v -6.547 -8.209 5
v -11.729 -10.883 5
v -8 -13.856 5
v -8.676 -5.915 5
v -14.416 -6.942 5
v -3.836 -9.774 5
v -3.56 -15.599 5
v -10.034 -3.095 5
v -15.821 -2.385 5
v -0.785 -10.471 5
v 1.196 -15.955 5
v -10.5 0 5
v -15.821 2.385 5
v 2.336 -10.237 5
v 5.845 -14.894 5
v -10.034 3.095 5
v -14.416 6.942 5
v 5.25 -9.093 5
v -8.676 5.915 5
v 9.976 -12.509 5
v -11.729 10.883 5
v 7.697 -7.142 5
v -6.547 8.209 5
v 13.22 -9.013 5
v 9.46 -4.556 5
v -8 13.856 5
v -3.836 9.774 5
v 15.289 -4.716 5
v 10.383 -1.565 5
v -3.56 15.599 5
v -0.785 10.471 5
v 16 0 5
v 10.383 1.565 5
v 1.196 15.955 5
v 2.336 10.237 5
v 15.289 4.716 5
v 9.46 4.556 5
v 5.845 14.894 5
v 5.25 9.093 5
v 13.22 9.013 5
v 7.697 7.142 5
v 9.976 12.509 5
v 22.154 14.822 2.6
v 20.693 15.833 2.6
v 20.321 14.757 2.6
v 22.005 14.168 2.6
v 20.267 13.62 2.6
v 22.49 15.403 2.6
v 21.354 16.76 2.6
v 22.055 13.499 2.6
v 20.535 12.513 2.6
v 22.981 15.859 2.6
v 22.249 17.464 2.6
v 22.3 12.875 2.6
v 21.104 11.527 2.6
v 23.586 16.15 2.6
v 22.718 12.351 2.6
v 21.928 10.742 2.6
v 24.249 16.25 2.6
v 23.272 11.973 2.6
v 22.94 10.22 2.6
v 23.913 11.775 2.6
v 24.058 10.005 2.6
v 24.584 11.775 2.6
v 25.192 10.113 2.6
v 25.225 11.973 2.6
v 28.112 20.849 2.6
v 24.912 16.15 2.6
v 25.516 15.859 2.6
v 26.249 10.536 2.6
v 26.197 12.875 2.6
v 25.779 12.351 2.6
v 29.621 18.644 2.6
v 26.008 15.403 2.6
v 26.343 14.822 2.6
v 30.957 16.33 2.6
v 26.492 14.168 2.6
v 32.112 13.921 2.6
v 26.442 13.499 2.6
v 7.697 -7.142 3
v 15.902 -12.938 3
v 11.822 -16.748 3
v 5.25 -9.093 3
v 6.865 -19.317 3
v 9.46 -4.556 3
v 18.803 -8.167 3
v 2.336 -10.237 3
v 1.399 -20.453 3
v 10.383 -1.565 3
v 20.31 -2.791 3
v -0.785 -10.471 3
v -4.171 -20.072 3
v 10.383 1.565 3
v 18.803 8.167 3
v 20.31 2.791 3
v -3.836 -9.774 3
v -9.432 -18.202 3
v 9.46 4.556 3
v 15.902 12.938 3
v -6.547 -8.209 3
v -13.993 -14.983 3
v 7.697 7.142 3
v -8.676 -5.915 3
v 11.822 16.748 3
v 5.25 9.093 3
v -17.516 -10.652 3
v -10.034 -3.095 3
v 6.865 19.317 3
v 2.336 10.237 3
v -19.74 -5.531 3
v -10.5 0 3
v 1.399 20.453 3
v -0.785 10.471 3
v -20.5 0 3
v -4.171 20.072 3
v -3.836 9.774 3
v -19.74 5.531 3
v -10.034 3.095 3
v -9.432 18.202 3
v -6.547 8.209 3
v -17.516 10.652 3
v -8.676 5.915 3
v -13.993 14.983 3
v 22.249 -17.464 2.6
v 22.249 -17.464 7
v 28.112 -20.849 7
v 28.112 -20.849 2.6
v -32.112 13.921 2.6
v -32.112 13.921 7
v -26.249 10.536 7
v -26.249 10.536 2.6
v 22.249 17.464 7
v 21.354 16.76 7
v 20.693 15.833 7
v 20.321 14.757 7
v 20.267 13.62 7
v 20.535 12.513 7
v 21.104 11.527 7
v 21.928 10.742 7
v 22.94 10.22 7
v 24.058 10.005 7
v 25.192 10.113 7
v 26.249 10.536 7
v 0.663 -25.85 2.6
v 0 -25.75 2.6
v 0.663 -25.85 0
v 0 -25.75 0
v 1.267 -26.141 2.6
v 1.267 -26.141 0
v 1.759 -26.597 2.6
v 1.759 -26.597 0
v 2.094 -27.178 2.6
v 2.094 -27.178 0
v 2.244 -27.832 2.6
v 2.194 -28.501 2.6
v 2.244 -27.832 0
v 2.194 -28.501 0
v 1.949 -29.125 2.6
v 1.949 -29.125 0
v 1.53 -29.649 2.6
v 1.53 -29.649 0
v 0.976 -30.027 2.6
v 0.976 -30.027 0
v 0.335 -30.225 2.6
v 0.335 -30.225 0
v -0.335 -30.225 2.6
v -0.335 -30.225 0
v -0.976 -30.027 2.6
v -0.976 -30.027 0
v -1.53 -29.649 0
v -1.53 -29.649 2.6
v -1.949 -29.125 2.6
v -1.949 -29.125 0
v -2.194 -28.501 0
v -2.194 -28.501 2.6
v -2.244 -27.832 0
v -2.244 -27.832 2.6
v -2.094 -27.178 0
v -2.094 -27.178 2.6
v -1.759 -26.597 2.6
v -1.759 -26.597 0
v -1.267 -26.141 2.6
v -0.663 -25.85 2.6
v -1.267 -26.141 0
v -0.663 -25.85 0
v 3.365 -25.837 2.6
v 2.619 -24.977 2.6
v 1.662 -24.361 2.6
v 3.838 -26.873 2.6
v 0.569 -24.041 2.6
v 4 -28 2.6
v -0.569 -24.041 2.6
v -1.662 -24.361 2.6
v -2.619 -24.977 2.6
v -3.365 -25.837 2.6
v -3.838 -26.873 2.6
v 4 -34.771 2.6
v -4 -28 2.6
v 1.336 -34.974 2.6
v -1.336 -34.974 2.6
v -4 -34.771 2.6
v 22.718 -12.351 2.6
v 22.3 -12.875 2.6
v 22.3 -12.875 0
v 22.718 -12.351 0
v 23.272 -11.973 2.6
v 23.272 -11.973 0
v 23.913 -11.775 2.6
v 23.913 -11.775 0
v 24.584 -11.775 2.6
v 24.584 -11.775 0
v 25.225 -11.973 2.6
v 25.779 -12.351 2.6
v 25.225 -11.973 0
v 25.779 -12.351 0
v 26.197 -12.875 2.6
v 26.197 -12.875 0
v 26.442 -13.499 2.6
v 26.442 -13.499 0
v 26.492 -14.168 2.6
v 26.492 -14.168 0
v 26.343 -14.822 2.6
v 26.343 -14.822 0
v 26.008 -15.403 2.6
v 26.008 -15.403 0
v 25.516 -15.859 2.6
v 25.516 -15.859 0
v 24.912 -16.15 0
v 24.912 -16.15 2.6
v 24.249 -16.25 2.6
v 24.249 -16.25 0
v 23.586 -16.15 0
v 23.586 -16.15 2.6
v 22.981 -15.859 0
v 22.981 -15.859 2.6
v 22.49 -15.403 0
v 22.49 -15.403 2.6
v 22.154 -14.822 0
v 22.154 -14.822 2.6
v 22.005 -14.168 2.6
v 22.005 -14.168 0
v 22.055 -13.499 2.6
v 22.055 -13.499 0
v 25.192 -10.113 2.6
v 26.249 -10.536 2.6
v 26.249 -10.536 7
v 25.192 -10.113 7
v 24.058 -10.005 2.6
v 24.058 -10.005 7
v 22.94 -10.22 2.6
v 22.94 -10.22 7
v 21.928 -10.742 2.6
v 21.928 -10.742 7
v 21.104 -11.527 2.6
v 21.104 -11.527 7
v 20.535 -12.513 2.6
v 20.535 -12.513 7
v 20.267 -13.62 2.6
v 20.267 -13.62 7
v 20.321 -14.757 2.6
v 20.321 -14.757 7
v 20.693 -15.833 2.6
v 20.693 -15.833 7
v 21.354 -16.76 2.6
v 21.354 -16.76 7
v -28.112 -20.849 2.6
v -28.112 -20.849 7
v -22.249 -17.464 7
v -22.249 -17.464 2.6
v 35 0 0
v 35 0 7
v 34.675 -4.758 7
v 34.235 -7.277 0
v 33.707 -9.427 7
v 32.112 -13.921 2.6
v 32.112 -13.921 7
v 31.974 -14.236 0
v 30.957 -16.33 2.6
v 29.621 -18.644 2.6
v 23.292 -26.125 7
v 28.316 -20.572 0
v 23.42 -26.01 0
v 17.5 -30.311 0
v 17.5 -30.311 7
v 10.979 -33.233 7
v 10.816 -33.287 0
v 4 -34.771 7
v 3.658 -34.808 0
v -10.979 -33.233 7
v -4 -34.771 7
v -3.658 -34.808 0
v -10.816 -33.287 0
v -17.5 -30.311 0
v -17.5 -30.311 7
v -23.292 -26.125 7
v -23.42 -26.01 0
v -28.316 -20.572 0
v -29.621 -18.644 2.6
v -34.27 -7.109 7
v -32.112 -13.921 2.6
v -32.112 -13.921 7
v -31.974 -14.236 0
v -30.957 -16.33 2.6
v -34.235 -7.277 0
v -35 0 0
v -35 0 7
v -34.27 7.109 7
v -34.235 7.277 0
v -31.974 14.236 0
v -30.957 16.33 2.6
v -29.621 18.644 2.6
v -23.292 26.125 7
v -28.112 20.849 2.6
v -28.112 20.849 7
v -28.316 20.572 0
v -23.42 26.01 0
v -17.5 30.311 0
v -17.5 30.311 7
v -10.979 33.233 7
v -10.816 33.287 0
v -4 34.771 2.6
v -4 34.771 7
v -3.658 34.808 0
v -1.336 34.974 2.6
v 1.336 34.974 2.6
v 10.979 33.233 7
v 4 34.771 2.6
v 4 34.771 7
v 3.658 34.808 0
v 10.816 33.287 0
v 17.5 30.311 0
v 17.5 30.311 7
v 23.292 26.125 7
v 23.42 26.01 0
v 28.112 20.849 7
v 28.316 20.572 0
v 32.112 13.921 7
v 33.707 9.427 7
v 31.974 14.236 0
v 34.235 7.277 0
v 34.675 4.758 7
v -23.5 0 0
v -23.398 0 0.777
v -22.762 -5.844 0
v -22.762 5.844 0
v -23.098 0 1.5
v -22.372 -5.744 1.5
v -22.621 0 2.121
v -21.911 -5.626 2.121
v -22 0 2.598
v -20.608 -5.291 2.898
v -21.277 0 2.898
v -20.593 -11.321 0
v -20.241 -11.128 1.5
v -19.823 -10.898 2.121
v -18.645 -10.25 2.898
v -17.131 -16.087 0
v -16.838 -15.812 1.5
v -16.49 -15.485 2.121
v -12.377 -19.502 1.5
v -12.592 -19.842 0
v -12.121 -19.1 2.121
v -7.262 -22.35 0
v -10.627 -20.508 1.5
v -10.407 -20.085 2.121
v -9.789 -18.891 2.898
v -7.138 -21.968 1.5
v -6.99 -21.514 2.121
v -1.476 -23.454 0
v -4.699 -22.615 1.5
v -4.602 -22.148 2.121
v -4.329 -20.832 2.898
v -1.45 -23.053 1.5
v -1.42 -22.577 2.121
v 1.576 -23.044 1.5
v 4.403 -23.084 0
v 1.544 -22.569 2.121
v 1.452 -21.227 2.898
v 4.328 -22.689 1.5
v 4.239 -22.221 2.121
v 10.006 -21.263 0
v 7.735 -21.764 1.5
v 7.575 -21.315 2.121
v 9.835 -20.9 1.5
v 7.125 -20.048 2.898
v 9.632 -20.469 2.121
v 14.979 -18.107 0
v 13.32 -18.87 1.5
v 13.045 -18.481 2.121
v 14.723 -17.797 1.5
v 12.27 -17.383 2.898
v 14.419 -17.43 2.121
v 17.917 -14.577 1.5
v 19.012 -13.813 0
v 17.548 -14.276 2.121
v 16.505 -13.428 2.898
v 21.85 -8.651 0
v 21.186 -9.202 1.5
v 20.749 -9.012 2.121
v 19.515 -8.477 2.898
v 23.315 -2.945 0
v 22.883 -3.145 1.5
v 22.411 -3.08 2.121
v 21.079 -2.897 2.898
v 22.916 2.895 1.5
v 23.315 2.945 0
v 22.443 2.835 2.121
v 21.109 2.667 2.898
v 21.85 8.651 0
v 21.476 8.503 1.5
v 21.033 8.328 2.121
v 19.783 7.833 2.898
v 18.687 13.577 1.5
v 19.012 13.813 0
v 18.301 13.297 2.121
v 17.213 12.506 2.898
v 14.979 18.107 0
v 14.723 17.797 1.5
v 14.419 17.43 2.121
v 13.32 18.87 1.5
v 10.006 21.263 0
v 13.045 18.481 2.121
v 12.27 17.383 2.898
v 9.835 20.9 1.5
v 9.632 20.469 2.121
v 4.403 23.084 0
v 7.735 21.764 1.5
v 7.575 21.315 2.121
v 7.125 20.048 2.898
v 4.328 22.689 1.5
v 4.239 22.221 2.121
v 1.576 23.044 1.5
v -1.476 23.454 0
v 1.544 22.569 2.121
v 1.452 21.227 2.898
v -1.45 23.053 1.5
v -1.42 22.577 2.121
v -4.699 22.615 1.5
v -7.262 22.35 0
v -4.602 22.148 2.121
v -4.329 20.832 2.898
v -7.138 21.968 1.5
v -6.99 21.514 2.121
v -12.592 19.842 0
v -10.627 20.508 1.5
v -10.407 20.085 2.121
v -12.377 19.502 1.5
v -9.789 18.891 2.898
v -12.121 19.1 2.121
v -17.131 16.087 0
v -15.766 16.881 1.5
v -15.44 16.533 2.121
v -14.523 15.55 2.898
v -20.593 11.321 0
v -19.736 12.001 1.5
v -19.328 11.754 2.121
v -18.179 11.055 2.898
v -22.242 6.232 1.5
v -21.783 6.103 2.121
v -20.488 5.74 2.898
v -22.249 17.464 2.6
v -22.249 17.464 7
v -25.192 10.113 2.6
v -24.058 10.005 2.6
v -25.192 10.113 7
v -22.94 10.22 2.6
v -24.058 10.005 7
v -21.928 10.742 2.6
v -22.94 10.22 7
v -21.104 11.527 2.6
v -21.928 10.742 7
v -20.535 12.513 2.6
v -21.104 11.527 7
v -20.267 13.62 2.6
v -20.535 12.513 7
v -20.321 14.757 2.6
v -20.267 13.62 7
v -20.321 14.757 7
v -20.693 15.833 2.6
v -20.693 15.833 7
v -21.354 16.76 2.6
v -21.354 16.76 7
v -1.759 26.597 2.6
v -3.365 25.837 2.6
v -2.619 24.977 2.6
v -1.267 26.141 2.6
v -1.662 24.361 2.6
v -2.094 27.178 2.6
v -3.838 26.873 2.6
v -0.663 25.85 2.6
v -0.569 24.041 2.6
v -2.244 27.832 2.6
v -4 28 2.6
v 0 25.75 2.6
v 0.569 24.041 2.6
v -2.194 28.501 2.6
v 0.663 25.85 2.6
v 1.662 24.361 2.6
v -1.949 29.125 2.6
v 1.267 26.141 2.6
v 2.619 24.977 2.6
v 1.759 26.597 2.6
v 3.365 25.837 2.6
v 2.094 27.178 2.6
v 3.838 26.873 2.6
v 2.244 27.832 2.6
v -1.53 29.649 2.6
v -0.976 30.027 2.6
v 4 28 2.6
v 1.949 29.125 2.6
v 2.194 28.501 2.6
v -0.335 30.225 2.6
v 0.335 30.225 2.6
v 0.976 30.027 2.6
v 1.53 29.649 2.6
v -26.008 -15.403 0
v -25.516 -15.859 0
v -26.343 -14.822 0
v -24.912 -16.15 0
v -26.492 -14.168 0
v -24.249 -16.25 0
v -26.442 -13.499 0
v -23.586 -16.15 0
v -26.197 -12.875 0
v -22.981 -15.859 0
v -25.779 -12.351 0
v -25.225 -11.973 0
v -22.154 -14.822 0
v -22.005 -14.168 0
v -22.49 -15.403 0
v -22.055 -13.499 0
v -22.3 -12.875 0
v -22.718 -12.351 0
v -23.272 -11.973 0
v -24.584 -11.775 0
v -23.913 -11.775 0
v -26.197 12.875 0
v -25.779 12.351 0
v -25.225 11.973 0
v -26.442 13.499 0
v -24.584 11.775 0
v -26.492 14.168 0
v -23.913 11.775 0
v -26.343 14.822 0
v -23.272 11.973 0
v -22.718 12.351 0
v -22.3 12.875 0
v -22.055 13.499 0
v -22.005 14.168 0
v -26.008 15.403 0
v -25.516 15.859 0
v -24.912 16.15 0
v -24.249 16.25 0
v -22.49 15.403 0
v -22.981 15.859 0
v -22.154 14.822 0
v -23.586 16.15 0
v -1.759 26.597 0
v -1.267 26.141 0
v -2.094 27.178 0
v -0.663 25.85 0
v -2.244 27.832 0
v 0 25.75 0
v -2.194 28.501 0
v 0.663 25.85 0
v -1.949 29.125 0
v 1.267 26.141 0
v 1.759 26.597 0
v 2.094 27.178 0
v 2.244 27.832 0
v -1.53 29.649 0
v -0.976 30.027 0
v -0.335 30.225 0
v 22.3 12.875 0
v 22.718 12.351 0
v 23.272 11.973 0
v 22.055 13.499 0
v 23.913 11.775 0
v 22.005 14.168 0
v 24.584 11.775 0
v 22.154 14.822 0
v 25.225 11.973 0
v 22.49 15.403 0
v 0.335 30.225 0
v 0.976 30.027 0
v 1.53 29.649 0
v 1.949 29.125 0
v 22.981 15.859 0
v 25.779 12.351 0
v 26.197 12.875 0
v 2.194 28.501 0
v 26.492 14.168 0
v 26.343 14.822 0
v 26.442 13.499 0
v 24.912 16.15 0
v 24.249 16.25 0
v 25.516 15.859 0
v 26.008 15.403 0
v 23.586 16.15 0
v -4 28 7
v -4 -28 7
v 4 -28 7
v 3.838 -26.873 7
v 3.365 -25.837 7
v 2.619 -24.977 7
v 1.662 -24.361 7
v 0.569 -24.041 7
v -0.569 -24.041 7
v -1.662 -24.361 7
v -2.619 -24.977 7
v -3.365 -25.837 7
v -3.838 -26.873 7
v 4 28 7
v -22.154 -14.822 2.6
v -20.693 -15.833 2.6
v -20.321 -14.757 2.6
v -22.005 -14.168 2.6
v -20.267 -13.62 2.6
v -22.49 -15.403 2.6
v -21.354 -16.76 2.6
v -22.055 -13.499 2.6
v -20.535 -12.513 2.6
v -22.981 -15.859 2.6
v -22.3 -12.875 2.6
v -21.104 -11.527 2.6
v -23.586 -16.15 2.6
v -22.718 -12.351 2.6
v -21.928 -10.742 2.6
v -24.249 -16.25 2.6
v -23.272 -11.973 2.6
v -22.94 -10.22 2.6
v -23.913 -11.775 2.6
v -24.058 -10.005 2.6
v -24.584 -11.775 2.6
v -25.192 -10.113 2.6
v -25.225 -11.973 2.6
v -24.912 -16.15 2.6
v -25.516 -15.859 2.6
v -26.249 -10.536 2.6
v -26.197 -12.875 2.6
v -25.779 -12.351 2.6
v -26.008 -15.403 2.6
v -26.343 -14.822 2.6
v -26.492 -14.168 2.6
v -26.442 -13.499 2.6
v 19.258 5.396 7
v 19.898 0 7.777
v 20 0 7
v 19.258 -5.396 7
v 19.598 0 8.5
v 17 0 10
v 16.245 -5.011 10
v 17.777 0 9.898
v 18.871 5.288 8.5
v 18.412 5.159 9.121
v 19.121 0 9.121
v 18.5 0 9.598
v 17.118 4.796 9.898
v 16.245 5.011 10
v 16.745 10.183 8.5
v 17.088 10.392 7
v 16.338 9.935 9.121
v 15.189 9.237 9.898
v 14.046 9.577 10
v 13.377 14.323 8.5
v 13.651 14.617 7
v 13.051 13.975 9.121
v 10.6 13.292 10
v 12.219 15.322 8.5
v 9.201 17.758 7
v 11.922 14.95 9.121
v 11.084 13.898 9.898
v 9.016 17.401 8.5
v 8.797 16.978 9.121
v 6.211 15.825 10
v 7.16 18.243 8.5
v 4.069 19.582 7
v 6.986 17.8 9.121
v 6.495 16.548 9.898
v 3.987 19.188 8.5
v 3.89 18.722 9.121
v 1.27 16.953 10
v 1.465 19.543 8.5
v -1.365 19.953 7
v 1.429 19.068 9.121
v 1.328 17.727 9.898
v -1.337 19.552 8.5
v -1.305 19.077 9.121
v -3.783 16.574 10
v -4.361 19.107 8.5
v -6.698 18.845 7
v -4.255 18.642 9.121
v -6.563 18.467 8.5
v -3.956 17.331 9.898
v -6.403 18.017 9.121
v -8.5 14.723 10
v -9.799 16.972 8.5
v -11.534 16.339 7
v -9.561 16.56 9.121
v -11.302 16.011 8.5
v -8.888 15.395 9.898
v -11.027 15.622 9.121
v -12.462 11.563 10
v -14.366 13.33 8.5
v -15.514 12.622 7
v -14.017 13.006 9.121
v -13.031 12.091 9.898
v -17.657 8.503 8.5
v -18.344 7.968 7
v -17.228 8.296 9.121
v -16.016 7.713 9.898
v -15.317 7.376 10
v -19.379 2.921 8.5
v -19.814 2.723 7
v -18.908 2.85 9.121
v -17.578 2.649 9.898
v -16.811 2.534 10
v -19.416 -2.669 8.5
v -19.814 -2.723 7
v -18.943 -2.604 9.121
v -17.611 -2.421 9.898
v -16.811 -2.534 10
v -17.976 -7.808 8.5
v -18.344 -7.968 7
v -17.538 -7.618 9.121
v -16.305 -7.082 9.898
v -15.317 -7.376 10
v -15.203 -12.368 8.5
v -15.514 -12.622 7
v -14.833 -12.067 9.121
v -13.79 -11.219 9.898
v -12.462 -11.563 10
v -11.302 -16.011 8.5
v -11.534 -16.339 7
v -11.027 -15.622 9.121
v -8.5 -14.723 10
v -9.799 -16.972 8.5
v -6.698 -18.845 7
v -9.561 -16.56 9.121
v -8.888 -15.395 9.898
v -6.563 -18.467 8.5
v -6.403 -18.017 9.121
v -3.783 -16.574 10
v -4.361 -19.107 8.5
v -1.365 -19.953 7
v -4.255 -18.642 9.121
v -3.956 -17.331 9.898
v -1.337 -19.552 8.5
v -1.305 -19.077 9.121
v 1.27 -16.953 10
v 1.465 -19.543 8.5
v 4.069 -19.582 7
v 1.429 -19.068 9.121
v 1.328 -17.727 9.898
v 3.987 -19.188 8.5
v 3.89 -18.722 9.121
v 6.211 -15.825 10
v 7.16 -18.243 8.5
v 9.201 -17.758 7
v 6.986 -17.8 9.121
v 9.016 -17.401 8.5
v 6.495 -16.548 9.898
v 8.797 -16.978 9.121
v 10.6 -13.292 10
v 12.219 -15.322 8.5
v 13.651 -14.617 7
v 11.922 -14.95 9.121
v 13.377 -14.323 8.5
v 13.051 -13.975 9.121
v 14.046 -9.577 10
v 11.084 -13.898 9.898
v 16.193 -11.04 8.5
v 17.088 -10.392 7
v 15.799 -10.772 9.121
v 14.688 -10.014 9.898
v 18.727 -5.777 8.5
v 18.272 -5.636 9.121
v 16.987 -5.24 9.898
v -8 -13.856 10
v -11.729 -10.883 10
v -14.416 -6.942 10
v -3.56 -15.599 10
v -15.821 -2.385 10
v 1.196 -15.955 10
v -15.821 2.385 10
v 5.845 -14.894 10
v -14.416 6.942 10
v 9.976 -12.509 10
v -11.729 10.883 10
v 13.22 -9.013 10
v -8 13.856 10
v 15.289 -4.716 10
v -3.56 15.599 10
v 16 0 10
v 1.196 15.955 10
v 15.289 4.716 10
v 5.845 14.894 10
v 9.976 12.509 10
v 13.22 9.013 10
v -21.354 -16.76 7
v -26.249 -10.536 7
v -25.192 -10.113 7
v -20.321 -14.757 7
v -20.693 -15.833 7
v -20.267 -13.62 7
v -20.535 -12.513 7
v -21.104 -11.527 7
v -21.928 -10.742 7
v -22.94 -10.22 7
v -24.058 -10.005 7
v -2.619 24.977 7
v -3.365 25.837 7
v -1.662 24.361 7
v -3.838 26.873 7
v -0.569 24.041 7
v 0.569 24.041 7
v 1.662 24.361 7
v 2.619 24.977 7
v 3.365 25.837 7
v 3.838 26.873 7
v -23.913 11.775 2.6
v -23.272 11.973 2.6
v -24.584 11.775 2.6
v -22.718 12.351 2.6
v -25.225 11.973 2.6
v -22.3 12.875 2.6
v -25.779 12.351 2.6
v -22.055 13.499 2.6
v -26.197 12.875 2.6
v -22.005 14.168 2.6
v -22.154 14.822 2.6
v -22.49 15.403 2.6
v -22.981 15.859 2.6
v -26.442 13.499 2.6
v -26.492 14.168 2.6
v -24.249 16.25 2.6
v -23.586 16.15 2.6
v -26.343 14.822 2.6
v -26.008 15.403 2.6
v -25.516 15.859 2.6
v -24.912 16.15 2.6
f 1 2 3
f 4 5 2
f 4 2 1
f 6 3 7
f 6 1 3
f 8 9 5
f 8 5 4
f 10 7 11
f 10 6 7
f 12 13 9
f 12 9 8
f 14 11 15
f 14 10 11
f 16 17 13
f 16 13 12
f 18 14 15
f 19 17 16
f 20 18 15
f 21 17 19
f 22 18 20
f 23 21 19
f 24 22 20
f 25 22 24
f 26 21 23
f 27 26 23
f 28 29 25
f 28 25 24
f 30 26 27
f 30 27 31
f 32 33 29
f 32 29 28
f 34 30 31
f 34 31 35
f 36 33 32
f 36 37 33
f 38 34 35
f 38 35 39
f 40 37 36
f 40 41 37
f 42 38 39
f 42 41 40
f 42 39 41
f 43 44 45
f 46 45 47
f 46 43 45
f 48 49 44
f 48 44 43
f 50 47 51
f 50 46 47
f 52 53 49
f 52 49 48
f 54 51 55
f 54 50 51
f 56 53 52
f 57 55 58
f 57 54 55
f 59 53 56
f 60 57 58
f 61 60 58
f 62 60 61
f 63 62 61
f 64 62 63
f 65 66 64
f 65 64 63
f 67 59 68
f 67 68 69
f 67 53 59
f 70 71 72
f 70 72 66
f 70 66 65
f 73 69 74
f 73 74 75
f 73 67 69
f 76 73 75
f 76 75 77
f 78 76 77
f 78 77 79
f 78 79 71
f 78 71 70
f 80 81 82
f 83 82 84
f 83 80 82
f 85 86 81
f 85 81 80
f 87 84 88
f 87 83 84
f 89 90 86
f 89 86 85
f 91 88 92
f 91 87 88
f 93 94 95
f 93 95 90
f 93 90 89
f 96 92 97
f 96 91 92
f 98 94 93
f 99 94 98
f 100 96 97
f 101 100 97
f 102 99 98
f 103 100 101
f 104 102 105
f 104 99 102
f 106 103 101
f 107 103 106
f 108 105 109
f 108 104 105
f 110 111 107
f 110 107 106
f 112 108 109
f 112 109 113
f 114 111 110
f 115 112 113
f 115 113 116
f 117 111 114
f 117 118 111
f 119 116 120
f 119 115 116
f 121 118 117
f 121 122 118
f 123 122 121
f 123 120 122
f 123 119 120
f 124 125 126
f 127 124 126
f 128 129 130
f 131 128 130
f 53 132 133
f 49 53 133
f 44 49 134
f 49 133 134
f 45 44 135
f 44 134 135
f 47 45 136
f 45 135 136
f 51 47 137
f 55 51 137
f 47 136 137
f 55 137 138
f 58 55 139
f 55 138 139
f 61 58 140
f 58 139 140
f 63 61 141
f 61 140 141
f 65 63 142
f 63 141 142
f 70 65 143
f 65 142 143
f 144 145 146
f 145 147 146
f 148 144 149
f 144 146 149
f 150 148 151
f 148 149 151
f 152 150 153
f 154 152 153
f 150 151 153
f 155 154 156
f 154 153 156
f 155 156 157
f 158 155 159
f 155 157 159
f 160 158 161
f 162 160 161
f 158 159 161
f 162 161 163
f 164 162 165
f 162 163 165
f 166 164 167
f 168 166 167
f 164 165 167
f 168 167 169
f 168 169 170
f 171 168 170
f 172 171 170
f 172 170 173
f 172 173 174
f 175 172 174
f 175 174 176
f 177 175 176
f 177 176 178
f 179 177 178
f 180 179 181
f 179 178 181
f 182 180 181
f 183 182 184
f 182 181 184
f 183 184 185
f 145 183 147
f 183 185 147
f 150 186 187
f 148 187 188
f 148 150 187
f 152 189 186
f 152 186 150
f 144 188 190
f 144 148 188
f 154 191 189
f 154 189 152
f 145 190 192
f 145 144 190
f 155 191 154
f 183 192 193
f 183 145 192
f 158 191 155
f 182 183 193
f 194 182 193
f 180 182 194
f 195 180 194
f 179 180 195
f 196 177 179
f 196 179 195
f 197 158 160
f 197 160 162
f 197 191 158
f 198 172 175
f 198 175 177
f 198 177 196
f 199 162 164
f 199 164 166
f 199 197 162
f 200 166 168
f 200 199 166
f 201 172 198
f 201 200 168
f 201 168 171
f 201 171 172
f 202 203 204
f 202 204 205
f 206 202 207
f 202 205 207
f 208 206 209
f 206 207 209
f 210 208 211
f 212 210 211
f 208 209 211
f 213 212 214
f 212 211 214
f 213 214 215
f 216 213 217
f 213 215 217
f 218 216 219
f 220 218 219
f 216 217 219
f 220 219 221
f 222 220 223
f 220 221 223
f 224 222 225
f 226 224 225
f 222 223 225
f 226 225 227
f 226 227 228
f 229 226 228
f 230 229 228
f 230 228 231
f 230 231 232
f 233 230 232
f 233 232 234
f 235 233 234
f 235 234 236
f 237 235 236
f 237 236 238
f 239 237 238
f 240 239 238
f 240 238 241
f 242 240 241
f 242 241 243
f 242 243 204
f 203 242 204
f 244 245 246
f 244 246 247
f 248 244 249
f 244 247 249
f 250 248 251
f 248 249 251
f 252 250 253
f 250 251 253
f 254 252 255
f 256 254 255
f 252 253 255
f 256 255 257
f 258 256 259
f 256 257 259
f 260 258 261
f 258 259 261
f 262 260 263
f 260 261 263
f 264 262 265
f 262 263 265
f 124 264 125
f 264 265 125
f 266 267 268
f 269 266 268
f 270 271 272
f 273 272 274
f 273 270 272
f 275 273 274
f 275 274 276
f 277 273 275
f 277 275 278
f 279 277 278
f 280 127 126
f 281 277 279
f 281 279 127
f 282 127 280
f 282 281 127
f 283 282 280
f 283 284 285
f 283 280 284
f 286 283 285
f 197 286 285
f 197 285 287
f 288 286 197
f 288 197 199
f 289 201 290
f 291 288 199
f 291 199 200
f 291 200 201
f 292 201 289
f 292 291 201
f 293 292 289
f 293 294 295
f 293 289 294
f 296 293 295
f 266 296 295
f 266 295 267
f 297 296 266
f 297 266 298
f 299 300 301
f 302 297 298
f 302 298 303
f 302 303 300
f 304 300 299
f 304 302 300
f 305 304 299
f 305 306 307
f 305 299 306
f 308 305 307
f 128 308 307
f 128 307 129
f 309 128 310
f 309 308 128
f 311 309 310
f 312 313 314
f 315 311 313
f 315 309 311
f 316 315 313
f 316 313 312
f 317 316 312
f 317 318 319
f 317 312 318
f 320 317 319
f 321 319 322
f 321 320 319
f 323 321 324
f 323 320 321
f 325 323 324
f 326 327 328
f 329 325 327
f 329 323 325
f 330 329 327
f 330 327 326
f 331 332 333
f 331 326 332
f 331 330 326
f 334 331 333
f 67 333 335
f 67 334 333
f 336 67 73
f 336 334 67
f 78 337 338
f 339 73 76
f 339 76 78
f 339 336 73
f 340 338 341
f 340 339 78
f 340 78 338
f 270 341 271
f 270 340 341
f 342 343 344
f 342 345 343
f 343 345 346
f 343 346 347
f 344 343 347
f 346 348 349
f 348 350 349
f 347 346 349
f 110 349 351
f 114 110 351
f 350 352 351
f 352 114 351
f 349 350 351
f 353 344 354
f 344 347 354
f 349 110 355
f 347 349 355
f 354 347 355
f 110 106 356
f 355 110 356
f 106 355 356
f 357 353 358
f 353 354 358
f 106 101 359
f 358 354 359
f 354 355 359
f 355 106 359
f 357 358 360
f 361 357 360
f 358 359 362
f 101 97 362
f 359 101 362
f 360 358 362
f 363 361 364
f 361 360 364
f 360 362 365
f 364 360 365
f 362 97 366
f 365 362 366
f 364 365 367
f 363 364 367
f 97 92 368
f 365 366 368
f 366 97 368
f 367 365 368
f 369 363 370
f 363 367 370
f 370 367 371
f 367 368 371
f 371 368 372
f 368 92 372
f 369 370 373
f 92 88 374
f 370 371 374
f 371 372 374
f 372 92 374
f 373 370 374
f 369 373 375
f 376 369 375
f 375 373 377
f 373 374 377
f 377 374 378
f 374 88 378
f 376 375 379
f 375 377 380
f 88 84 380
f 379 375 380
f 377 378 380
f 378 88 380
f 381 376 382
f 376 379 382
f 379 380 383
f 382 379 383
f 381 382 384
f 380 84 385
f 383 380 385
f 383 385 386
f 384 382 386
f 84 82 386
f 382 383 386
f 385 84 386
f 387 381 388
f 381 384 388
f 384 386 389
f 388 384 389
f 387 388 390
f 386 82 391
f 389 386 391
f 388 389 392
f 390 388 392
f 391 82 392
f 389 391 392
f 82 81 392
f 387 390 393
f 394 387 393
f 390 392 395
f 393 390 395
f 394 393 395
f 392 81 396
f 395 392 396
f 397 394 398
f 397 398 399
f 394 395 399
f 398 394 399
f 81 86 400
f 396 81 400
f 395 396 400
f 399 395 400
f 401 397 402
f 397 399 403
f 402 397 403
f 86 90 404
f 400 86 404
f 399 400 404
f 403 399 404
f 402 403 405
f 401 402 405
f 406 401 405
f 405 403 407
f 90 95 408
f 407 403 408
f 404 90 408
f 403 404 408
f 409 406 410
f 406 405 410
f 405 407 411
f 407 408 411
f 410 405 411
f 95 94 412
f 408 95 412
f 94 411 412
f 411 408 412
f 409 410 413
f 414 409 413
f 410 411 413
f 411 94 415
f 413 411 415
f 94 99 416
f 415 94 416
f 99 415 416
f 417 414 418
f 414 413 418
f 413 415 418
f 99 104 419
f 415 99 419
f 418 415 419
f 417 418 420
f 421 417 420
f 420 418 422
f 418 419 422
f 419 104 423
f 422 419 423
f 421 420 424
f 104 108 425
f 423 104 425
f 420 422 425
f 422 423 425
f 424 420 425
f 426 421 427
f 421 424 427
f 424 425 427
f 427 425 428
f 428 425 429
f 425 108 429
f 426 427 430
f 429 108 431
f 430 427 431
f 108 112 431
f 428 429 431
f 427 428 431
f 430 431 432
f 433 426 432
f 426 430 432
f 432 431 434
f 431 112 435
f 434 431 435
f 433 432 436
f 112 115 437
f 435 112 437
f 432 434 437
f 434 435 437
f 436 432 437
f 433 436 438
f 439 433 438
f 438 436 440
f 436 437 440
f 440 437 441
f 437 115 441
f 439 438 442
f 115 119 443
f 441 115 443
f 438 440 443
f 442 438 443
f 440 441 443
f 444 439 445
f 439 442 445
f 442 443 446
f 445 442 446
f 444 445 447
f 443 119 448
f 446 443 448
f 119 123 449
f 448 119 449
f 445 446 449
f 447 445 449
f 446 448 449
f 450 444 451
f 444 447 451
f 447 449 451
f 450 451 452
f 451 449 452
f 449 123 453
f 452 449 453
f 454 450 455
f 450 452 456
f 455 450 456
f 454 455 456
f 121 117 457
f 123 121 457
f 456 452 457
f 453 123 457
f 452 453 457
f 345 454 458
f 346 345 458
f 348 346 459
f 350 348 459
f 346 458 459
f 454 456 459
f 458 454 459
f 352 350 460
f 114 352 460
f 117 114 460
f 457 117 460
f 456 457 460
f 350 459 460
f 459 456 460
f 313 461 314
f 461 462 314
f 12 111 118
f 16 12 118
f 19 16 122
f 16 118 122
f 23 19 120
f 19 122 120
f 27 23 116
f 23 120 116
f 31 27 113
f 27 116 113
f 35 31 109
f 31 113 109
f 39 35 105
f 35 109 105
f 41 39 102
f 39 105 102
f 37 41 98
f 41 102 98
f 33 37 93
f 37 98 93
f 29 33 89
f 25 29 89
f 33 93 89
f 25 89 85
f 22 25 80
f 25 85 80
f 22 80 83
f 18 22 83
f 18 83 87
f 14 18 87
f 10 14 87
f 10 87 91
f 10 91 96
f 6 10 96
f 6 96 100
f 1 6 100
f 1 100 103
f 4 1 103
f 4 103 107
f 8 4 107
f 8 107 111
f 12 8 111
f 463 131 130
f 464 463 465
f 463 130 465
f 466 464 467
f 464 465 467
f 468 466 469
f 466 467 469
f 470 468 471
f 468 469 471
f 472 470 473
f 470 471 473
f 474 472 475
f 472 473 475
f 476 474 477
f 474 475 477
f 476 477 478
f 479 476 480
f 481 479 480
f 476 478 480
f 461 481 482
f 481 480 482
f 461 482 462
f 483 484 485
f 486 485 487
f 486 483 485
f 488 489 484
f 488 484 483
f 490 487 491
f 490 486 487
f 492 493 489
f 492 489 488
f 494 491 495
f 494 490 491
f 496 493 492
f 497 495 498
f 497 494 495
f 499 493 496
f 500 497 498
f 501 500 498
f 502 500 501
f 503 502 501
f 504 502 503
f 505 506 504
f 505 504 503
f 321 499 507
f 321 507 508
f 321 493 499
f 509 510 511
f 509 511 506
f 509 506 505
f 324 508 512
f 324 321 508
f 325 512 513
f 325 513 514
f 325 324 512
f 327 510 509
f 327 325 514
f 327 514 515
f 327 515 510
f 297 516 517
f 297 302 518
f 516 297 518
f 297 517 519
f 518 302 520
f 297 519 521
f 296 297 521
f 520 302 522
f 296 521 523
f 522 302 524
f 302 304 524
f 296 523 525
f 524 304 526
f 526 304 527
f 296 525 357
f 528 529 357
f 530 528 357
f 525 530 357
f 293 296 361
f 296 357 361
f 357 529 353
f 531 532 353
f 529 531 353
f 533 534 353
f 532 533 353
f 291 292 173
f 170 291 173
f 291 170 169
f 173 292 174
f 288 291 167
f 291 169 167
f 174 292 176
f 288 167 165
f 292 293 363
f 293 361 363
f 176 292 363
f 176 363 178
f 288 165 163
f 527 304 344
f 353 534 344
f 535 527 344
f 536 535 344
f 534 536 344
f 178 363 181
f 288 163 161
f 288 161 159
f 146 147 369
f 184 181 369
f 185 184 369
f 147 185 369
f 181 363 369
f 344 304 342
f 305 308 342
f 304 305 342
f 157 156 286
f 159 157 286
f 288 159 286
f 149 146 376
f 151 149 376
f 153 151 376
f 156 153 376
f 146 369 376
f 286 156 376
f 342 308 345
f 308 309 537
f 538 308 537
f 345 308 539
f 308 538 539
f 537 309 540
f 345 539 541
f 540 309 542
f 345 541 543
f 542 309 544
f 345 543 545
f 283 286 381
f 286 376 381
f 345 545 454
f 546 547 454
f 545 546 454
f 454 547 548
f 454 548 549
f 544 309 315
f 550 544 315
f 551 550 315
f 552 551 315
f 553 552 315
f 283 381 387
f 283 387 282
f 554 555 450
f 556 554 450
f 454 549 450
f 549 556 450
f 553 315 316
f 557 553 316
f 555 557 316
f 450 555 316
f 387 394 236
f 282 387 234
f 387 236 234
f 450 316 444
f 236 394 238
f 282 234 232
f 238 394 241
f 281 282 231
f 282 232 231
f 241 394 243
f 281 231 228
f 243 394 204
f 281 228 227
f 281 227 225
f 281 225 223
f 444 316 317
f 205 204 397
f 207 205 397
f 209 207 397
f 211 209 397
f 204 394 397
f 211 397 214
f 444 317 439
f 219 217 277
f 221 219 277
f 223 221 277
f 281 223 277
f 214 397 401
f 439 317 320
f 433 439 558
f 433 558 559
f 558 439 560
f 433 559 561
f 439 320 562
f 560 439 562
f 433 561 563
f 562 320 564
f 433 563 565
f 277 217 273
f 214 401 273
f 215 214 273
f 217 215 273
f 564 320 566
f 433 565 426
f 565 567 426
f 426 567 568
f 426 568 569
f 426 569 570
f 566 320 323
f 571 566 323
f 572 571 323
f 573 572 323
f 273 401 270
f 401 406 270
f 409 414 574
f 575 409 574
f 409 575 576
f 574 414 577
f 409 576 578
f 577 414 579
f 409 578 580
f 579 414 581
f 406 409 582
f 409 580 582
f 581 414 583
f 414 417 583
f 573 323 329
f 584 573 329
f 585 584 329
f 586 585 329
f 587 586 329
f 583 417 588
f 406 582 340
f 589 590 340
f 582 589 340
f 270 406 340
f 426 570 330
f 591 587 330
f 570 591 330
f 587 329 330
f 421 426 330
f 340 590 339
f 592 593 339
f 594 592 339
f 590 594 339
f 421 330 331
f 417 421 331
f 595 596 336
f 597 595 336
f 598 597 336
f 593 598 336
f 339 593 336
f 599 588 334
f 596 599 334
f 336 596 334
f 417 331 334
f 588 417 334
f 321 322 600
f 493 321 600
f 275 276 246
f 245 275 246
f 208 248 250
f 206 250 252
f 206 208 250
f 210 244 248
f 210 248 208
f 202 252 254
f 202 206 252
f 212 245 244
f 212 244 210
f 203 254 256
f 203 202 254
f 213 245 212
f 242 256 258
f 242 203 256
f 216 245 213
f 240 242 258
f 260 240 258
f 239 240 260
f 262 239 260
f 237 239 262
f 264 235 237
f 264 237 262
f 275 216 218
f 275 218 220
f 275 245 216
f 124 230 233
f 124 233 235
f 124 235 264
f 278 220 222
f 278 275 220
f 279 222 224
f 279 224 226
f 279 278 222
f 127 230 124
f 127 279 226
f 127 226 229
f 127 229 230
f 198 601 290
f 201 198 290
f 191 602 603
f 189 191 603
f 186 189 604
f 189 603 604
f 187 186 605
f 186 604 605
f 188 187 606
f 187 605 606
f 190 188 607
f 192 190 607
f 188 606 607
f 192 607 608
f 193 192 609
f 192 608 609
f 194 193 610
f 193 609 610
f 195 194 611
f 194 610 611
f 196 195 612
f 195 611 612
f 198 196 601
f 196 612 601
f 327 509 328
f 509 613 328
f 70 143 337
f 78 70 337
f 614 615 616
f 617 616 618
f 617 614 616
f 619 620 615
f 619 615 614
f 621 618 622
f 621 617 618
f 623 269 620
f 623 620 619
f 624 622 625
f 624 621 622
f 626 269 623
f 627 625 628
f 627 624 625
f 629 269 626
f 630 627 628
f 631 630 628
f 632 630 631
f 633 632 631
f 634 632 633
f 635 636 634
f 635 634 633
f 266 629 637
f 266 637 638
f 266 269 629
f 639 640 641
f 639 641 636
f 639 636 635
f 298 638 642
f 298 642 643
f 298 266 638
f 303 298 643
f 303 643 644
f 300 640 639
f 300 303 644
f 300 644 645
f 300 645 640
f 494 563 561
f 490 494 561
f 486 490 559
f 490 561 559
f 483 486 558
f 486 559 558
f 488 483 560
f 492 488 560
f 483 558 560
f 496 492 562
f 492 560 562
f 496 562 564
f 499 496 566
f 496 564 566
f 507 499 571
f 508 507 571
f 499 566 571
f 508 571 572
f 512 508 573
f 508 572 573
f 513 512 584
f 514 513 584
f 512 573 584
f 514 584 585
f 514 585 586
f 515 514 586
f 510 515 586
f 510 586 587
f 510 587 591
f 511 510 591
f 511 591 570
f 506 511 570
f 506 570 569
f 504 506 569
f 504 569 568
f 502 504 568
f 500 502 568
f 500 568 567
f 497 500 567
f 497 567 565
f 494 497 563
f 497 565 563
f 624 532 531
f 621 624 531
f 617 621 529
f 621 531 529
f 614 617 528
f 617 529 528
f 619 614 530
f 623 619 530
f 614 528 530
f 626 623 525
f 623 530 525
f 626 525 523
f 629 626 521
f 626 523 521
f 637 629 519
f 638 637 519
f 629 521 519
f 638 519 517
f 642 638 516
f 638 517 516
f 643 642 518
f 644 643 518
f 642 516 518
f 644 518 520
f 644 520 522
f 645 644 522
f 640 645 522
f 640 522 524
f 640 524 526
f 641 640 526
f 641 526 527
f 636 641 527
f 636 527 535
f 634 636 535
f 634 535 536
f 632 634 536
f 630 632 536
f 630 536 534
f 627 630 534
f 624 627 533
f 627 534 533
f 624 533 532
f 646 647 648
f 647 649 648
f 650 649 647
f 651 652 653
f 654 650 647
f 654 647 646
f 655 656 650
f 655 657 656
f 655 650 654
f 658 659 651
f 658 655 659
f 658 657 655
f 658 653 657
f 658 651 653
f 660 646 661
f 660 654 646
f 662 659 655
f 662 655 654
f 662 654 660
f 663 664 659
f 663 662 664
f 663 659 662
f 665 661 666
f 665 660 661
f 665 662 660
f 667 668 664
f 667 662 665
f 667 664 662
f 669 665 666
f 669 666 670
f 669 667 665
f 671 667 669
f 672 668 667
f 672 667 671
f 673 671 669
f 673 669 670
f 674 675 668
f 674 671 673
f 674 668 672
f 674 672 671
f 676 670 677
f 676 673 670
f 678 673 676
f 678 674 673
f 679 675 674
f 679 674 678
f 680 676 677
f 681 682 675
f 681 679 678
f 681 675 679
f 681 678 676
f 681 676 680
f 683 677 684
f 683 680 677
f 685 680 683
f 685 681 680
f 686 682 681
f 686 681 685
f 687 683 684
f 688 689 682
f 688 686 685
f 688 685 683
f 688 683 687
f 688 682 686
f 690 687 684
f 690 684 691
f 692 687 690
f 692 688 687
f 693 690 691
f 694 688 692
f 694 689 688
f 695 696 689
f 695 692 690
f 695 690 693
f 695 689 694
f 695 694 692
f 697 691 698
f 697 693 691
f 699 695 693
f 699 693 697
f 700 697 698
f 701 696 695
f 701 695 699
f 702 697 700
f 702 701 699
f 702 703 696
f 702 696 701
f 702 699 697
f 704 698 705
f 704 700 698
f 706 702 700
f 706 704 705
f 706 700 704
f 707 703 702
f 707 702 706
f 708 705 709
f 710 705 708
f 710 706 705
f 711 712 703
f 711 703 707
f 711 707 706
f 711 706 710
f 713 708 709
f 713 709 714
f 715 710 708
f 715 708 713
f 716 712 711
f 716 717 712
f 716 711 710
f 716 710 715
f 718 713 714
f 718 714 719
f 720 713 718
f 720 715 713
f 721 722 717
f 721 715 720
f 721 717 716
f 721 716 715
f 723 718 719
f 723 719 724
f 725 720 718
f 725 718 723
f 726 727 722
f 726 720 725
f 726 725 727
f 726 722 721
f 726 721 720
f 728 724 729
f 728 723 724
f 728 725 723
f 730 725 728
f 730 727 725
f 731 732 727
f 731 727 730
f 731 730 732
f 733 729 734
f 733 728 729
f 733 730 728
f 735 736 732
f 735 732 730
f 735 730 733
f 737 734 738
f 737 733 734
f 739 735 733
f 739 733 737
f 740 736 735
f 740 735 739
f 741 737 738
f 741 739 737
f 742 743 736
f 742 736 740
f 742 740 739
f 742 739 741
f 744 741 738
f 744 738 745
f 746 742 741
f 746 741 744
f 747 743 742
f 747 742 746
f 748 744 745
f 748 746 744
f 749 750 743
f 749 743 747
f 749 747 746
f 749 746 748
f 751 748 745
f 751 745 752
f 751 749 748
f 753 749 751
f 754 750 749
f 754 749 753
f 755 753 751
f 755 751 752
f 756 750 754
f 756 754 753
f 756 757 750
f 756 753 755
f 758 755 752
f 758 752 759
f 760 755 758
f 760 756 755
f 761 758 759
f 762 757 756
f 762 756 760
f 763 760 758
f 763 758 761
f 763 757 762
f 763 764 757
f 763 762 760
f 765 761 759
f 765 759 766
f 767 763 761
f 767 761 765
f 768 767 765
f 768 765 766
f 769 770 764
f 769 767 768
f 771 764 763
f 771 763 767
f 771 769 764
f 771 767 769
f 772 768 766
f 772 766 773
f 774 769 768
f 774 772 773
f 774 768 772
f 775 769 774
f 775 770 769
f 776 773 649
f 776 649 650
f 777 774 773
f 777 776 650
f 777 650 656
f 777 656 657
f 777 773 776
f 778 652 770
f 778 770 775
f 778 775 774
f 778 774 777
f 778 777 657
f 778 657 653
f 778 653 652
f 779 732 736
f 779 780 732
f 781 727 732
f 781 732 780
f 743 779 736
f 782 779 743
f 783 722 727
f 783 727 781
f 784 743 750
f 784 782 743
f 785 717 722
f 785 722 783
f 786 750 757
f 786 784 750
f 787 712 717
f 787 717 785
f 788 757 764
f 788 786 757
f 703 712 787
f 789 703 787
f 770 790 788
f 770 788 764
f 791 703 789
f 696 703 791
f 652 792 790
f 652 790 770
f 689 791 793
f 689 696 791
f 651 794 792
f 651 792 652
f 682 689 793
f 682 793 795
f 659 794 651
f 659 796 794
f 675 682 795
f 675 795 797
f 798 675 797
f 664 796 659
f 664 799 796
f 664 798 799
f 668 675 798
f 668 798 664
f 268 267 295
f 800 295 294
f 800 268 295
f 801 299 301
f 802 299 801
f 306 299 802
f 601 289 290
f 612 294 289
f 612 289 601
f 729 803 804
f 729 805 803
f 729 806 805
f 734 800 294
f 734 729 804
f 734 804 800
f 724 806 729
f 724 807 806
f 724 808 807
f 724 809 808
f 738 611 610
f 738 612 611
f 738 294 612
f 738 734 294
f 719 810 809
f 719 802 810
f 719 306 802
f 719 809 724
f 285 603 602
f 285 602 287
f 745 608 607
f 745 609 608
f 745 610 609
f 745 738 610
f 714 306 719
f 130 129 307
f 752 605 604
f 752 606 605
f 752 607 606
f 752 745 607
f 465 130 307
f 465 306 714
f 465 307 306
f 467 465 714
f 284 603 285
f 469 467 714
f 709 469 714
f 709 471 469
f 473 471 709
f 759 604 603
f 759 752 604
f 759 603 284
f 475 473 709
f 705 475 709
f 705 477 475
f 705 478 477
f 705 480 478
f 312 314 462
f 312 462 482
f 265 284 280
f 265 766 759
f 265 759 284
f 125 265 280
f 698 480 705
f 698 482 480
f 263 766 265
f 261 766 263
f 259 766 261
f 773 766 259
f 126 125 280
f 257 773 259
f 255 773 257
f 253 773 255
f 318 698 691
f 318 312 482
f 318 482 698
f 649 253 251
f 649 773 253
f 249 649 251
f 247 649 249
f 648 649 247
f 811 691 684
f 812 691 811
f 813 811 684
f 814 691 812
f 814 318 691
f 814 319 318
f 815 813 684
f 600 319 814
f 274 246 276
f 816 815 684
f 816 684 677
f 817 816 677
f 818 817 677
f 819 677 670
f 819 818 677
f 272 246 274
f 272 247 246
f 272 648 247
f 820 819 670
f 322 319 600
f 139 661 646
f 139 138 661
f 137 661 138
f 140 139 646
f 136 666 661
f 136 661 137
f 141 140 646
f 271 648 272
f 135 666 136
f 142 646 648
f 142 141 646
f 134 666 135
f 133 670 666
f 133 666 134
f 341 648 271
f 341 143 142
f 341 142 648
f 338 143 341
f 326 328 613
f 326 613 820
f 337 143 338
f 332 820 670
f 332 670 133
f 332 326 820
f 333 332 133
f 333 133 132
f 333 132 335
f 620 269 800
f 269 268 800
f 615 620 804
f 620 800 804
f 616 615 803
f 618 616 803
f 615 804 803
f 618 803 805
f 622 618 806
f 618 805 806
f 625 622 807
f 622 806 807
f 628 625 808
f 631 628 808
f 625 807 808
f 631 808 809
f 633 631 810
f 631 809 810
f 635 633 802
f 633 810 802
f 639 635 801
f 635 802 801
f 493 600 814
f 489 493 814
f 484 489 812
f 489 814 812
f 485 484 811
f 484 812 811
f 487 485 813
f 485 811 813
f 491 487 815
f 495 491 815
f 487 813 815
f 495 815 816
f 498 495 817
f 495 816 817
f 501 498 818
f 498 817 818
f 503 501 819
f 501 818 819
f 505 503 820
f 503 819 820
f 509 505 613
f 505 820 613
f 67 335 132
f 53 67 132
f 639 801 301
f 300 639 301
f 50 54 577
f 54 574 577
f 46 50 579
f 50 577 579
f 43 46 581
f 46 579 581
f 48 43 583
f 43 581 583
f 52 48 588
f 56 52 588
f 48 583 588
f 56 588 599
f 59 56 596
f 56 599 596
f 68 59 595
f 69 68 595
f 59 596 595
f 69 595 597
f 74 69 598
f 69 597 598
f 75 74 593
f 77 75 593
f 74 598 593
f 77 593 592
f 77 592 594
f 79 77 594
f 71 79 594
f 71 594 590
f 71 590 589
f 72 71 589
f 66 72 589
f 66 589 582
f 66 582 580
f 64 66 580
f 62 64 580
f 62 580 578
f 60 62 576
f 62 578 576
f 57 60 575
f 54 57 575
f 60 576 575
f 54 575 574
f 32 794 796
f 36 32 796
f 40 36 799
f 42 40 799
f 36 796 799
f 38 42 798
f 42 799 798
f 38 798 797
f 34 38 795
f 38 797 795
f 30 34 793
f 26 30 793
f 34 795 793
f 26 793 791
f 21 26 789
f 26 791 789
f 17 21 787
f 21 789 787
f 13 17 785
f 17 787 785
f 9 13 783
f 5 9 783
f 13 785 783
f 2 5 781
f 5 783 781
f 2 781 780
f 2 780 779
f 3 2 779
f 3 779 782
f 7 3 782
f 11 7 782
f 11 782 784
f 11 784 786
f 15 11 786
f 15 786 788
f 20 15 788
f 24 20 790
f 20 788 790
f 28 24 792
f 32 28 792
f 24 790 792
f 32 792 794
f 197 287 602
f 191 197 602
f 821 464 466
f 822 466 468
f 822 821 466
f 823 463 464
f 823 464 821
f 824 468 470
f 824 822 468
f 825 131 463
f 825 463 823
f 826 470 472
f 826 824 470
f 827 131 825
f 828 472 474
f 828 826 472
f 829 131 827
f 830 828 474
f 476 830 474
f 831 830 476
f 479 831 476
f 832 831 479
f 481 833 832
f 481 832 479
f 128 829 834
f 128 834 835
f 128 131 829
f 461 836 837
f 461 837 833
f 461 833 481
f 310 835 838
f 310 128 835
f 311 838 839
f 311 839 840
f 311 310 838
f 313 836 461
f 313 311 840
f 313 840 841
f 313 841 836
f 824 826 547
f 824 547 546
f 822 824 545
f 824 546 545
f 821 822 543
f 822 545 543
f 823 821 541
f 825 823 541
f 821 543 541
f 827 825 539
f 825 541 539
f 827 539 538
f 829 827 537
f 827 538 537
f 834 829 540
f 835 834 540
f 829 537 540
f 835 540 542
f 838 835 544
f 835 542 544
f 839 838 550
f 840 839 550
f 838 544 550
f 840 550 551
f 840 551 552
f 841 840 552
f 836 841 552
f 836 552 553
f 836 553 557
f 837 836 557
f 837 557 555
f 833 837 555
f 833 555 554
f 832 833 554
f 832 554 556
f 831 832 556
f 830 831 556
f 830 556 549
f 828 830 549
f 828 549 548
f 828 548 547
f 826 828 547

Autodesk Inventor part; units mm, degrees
ref_plane "YZ Plane" through (0, 0, 0) normal (1, 0, 0) x (0, 1, 0)
ref_plane "XZ Plane" through (0, 0, 0) normal (0, 1, 0) x (-1, 0, 0)
ref_plane "XY Plane" through (0, 0, 0) normal (0, 0, 1) x (1, 0, 0)
sketch "스케치13" plane through (0, 0, 0) normal (0, 0, 1) x (1, 0, 0)
  circle A0 centre (0, 0) radius 35
  dimension "d74" = 70
extrude "돌출11" add sketch "스케치13" along normal blind 7
sketch "스케치19" plane through (0, 0, 7) normal (0, 0, 1) x (1, 0, 0)
  circle A0 centre (0, 0) radius 20
  dimension "d92" = 40
extrude "돌출17" add sketch "스케치19" along normal blind 3
sketch "스케치20" plane through (0, 0, 10) normal (0, 0, 1) x (1, 0, 0)
  circle A0 centre (0, 0) radius 16
  dimension "d95" = 32
extrude "돌출18" cut sketch "스케치20" against normal blind 5
sketch "스케치16" plane through (0, 0, 0) normal (0, 0, -1) x (-1, 0, 0)
  circle A0 centre (0, 0) radius 23.5
  dimension "d83" = 47
extrude "돌출15" cut sketch "스케치16" against normal blind 3
sketch "스케치18" plane through (0, 0, 3) normal (0, 0, -1) x (-1, 0, 0)
  circle A0 centre (0, 0) radius 10.5
  dimension "d89" = 21
extrude "돌출16" cut sketch "스케치18" against normal up to next
fillet "모깎기3" radius 3 2 edges at (-20, 0, 10) (23.5, 0, 3)
sketch "스케치21" plane through (0, 0, 7) normal (0, 0, 1) x (1, 0, 0)
  circle A0 centre (0, 28) radius 4
  line L0 (-4, 28) -> (4, 28)
  line L1 (4, 28) -> (4, 38)
  line L2 (4, 38) -> (-4, 38)
  line L3 (-4, 38) -> (-4, 28)
  point P0 (0, 0)
  dimension "d99" = 8
  dimension "d100" = 28
extrude "돌출19" cut sketch "스케치21" against normal blind 4.4
sketch "스케치22" plane through (0, 0, 2.6) normal (0, 0, 1) x (1, 0, 0)
  arc A0 (-4, 28) -> (4, 28) centre (0, 28) ccw projected
  circle A1 centre (0, 28) radius 4
  point P0 (0, 0)
hole "구멍2" at (0, 28, 2.6) direction (0, 0, -1) diameter 4.5 end through all
pattern_circular "원형 패턴3" count 6 over 360 about axis through (0, 0, 3) along (0, 0, 1) of "돌출19", "구멍2"
properties part number "도면3-2번"
